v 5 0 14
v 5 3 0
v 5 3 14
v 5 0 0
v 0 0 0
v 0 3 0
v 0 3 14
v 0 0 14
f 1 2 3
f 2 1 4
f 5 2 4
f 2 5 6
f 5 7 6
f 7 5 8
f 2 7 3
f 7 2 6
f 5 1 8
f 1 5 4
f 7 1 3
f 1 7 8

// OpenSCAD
translate([2.5, 1.5, 1.0]) color([0.9609071038114427, 0.29634664160852753, 0.8784103092413238]) cube([5, 3, 2], center=true);
translate([2.5, 1.5, 3.0]) color([0.5532045188241876, 0.32698413866792275, 0.5930193960141523]) cube([5, 3, 2], center=true);
translate([2.5, 1.5, 5.0]) color([0.08080901281968078, 0.5332278801564081, 0.30776249733867533]) cube([5, 3, 2], center=true);
translate([2.5, 1.5, 7.0]) color([0.3765889324074634, 0.14692685712634312, 0.1252359956830017]) cube([5, 3, 2], center=true);
translate([2.5, 1.5, 9.0]) color([0.2228174233130471, 0.5083324480268261, 0.23665719296677712]) cube([5, 3, 2], center=true);
translate([2.5, 1.5, 11.0]) color([0.18394442119493715, 0.3724619255943996, 0.6631955135334705]) cube([5, 3, 2], center=true);
translate([2.5, 1.5, 13.0]) color([0.8609746033864751, 0.6012082175951422, 0.3938011681878649]) cube([5, 3, 2], center=true);
